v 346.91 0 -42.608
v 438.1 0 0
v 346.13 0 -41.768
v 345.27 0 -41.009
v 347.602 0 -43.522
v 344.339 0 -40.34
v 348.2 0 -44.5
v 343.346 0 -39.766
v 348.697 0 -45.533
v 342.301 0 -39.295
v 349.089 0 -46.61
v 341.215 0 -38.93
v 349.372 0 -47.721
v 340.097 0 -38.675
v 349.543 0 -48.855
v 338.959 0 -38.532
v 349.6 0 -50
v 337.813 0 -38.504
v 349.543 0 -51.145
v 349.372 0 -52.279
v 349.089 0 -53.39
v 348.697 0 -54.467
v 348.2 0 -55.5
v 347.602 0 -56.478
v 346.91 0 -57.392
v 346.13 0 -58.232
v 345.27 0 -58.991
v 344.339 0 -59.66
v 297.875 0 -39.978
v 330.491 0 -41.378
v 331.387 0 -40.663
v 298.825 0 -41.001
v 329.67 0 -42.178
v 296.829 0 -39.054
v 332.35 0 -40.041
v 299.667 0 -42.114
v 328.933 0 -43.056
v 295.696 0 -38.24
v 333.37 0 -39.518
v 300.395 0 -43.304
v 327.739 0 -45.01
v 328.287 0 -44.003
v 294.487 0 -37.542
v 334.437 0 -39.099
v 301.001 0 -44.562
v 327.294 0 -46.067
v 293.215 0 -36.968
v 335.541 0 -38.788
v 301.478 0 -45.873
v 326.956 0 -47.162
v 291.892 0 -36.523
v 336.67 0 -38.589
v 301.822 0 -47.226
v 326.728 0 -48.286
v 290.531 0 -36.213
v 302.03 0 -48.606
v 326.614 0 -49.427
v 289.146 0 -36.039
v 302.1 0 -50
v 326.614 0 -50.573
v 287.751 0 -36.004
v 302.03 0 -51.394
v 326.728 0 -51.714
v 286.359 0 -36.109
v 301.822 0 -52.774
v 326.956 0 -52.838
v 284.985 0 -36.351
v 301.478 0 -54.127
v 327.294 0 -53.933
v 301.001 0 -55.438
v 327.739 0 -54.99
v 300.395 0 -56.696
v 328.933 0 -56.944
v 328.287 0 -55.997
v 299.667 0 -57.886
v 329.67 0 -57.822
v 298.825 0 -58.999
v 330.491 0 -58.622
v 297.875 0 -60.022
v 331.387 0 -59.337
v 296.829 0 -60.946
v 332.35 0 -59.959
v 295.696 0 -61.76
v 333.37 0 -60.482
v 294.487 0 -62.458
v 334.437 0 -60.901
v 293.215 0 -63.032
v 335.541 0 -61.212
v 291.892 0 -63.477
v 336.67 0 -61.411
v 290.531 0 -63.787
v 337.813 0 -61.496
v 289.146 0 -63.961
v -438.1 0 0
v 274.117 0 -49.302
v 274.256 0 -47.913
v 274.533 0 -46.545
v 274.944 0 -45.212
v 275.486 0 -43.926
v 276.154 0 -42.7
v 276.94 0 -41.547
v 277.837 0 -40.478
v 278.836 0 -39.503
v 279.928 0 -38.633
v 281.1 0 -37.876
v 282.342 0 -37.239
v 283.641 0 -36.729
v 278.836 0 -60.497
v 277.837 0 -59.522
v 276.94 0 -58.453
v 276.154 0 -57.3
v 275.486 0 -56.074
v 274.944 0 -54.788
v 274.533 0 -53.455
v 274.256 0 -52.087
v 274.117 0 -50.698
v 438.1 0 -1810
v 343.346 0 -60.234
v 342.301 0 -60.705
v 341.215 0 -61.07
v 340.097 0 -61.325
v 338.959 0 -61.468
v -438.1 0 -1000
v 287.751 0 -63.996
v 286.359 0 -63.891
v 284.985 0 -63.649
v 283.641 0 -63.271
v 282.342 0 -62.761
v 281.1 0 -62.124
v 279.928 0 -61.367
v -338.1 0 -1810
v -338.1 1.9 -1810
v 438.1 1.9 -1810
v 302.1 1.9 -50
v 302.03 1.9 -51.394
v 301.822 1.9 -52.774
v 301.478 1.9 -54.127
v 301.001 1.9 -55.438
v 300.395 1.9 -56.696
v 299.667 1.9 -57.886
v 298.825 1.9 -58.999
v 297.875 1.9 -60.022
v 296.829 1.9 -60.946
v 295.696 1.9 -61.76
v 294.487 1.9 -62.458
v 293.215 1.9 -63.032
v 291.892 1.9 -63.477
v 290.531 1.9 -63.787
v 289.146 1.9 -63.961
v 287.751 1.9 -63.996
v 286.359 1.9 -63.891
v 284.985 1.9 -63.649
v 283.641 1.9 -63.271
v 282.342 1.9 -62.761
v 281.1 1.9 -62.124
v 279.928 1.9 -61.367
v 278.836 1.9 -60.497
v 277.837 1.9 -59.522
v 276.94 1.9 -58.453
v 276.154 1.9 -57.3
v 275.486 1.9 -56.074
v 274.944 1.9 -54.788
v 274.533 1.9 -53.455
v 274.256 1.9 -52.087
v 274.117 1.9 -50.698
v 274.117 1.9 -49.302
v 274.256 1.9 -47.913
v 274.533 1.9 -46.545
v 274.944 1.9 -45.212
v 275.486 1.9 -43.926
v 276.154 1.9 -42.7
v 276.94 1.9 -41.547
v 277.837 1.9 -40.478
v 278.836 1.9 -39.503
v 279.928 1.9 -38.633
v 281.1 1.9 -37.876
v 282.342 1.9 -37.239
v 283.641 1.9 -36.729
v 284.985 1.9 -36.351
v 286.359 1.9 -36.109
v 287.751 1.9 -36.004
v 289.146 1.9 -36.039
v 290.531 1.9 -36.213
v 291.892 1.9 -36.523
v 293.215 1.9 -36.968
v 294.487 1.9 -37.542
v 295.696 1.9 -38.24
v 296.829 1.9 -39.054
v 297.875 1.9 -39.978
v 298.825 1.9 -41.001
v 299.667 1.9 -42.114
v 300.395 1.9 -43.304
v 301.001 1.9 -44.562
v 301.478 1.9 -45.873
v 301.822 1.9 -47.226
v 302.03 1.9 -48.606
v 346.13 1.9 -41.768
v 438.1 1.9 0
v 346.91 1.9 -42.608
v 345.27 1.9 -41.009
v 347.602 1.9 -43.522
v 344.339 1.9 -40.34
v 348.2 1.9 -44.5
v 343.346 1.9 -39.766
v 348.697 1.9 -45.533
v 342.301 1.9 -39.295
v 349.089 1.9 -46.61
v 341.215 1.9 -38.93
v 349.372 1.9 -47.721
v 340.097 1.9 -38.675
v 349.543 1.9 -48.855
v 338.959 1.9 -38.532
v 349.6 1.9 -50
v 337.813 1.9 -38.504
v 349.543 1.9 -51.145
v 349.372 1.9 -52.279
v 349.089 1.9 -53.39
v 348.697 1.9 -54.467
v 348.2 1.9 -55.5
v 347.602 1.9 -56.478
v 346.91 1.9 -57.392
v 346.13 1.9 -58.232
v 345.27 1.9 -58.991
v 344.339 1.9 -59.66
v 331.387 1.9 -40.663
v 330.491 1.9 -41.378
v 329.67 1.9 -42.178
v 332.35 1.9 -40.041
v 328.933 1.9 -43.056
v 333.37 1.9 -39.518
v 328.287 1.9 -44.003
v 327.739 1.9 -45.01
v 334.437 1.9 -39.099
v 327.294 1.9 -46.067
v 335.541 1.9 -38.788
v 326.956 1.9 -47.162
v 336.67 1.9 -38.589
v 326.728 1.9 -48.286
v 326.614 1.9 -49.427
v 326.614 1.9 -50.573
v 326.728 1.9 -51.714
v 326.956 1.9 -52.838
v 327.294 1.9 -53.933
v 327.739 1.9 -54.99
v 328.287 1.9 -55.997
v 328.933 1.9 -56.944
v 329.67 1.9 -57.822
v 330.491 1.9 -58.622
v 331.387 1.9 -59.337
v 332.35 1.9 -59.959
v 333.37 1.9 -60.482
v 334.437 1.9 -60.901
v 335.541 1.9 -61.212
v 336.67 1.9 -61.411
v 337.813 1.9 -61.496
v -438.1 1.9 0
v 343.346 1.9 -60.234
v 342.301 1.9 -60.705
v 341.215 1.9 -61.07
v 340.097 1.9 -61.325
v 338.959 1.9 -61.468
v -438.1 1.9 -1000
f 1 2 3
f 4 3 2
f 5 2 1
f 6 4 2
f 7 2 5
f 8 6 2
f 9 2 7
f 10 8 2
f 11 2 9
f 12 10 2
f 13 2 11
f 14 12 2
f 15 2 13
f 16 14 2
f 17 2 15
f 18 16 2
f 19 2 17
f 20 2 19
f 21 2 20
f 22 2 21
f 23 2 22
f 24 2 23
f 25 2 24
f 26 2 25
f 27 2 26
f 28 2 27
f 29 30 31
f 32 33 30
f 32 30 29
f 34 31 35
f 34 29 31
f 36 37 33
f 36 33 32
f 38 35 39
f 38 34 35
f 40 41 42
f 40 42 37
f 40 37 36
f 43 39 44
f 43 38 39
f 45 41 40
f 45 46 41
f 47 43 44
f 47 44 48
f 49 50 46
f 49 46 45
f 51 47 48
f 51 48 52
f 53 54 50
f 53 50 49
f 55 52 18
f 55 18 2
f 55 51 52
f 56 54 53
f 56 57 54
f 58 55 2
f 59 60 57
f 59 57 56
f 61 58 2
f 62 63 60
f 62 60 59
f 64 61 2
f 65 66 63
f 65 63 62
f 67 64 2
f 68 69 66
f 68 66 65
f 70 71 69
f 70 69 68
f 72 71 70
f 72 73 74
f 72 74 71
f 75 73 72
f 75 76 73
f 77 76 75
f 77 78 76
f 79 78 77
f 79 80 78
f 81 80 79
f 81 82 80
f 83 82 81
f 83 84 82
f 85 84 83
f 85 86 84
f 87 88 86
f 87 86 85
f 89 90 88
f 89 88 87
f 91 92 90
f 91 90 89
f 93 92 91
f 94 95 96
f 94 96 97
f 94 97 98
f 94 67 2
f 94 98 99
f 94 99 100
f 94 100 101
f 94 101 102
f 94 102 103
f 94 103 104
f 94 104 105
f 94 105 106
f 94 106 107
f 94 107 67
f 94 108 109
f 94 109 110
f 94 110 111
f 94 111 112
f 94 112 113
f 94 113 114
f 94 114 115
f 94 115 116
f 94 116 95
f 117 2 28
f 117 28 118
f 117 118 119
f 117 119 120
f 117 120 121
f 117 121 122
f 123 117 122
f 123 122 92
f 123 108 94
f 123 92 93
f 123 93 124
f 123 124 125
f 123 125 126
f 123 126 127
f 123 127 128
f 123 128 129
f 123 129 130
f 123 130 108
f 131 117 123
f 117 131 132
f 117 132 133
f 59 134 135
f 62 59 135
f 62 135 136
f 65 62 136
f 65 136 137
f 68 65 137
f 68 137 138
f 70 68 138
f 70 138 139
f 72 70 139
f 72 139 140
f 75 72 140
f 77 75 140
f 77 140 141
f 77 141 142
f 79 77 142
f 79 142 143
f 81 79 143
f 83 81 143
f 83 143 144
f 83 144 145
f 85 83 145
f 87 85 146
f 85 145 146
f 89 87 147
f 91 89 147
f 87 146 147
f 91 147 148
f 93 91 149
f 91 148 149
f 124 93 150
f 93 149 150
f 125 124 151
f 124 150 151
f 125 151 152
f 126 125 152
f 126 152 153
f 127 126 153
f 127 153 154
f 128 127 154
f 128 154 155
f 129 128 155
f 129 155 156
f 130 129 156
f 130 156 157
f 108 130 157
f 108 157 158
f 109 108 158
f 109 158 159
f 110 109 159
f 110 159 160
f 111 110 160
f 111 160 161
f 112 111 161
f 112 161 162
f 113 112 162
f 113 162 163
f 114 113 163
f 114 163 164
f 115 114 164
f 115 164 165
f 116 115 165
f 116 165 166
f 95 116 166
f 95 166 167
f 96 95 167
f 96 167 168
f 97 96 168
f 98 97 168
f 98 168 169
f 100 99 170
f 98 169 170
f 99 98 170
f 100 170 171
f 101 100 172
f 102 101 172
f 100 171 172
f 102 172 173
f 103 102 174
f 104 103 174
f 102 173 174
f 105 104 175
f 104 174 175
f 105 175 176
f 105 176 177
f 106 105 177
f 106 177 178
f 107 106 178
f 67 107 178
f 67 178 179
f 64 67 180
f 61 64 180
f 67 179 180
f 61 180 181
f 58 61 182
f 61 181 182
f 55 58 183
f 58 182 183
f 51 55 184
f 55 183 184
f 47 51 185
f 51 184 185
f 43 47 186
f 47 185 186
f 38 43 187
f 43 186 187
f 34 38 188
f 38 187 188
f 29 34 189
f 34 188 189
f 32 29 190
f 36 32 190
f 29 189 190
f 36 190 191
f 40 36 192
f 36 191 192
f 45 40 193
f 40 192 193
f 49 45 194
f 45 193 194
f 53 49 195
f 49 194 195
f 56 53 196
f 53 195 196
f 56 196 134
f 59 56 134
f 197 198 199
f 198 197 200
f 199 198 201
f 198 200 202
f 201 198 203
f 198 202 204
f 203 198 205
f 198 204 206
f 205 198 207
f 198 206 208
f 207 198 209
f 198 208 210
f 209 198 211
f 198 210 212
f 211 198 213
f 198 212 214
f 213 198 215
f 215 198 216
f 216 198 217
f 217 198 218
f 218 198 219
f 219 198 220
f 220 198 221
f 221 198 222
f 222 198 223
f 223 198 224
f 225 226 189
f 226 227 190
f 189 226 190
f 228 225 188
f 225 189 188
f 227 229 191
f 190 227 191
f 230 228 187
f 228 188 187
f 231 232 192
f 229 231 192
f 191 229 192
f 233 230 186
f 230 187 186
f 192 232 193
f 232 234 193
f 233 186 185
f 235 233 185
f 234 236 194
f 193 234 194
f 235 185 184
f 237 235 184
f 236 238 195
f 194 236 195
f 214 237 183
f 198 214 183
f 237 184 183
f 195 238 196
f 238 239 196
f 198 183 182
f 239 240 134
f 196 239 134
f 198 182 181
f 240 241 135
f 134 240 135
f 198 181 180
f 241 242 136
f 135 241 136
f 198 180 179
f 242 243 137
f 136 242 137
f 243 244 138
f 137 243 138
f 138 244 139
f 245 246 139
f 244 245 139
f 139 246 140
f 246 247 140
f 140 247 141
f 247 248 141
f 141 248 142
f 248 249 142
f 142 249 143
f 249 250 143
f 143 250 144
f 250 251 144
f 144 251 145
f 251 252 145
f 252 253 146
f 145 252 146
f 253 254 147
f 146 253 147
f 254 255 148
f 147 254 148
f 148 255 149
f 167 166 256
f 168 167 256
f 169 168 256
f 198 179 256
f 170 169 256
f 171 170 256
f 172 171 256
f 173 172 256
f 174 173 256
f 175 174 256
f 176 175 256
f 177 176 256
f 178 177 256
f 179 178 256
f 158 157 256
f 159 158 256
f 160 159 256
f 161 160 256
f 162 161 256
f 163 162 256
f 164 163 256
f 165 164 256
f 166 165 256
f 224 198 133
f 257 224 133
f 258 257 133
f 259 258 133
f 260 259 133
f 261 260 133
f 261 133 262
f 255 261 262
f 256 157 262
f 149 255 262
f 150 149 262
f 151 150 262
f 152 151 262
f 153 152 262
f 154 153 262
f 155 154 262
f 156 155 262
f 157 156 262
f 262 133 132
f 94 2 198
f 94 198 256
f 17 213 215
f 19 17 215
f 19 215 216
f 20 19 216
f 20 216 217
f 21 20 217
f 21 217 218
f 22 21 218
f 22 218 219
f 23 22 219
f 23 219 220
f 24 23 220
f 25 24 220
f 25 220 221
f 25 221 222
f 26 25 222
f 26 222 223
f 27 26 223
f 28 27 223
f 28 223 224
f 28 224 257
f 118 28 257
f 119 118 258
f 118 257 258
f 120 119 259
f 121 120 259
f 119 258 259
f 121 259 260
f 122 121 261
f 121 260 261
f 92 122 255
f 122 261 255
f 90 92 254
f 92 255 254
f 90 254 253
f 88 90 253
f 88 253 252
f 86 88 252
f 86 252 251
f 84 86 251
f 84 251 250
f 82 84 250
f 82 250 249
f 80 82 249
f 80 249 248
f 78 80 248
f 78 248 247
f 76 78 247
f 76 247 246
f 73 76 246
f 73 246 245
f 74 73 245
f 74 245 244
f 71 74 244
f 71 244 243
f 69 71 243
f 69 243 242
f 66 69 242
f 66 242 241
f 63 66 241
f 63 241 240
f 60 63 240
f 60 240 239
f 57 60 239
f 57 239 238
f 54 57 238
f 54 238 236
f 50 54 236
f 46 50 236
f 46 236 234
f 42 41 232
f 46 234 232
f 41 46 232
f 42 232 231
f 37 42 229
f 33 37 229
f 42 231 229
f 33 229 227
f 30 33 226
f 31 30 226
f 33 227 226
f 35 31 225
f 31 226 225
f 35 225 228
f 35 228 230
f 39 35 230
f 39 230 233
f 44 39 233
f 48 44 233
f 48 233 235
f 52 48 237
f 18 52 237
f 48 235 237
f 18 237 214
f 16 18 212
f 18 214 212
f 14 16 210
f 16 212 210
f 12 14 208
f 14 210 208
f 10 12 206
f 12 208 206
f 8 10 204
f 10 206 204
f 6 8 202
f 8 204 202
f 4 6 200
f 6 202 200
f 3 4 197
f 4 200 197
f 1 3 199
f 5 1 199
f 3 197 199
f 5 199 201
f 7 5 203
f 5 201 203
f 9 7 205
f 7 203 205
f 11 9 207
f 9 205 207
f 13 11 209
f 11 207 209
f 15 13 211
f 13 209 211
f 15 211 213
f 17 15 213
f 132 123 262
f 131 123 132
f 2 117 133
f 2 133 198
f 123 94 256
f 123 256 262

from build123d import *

# Parameters (mm, degrees)
SALIENTE_EXTRUIR1_DEPTH    = 1.9
CROQUIS3_R                 = 11.5
CROQUIS3_R_2               = 14
CORTAR_EXTRUIR1_DEPTH      = 1
CORTAR_EXTRUIR1_DEPTH_BACK = 2.9


with BuildPart() as part:
    # Croquis2 → Saliente-Extruir1 (new body)
    with BuildSketch(Plane(origin=(0, 0, 0), x_dir=(1, 0, 0), z_dir=(0, 1, 0))):
        Polygon((438.1, 0), (-438.1, 0), (-438.1, 1000), (-338.1, 1810), (438.1, 1810), align=None)
    extrude(amount=SALIENTE_EXTRUIR1_DEPTH)

    # Croquis3 → Cortar-Extruir1 (cut, two sides)
    with BuildSketch(Plane(origin=(0, 1.9, 0), x_dir=(1, 0, 0), z_dir=(0, 1, 0))) as cortar_extruir1_sk:
        with Locations((338.1, 50)):
            Circle(CROQUIS3_R)
        with Locations((288.1, 50)):
            Circle(CROQUIS3_R_2)
    extrude(amount=CORTAR_EXTRUIR1_DEPTH, mode=Mode.SUBTRACT)
    extrude(cortar_extruir1_sk.sketch, amount=-CORTAR_EXTRUIR1_DEPTH_BACK, mode=Mode.SUBTRACT)


solid = part.part
